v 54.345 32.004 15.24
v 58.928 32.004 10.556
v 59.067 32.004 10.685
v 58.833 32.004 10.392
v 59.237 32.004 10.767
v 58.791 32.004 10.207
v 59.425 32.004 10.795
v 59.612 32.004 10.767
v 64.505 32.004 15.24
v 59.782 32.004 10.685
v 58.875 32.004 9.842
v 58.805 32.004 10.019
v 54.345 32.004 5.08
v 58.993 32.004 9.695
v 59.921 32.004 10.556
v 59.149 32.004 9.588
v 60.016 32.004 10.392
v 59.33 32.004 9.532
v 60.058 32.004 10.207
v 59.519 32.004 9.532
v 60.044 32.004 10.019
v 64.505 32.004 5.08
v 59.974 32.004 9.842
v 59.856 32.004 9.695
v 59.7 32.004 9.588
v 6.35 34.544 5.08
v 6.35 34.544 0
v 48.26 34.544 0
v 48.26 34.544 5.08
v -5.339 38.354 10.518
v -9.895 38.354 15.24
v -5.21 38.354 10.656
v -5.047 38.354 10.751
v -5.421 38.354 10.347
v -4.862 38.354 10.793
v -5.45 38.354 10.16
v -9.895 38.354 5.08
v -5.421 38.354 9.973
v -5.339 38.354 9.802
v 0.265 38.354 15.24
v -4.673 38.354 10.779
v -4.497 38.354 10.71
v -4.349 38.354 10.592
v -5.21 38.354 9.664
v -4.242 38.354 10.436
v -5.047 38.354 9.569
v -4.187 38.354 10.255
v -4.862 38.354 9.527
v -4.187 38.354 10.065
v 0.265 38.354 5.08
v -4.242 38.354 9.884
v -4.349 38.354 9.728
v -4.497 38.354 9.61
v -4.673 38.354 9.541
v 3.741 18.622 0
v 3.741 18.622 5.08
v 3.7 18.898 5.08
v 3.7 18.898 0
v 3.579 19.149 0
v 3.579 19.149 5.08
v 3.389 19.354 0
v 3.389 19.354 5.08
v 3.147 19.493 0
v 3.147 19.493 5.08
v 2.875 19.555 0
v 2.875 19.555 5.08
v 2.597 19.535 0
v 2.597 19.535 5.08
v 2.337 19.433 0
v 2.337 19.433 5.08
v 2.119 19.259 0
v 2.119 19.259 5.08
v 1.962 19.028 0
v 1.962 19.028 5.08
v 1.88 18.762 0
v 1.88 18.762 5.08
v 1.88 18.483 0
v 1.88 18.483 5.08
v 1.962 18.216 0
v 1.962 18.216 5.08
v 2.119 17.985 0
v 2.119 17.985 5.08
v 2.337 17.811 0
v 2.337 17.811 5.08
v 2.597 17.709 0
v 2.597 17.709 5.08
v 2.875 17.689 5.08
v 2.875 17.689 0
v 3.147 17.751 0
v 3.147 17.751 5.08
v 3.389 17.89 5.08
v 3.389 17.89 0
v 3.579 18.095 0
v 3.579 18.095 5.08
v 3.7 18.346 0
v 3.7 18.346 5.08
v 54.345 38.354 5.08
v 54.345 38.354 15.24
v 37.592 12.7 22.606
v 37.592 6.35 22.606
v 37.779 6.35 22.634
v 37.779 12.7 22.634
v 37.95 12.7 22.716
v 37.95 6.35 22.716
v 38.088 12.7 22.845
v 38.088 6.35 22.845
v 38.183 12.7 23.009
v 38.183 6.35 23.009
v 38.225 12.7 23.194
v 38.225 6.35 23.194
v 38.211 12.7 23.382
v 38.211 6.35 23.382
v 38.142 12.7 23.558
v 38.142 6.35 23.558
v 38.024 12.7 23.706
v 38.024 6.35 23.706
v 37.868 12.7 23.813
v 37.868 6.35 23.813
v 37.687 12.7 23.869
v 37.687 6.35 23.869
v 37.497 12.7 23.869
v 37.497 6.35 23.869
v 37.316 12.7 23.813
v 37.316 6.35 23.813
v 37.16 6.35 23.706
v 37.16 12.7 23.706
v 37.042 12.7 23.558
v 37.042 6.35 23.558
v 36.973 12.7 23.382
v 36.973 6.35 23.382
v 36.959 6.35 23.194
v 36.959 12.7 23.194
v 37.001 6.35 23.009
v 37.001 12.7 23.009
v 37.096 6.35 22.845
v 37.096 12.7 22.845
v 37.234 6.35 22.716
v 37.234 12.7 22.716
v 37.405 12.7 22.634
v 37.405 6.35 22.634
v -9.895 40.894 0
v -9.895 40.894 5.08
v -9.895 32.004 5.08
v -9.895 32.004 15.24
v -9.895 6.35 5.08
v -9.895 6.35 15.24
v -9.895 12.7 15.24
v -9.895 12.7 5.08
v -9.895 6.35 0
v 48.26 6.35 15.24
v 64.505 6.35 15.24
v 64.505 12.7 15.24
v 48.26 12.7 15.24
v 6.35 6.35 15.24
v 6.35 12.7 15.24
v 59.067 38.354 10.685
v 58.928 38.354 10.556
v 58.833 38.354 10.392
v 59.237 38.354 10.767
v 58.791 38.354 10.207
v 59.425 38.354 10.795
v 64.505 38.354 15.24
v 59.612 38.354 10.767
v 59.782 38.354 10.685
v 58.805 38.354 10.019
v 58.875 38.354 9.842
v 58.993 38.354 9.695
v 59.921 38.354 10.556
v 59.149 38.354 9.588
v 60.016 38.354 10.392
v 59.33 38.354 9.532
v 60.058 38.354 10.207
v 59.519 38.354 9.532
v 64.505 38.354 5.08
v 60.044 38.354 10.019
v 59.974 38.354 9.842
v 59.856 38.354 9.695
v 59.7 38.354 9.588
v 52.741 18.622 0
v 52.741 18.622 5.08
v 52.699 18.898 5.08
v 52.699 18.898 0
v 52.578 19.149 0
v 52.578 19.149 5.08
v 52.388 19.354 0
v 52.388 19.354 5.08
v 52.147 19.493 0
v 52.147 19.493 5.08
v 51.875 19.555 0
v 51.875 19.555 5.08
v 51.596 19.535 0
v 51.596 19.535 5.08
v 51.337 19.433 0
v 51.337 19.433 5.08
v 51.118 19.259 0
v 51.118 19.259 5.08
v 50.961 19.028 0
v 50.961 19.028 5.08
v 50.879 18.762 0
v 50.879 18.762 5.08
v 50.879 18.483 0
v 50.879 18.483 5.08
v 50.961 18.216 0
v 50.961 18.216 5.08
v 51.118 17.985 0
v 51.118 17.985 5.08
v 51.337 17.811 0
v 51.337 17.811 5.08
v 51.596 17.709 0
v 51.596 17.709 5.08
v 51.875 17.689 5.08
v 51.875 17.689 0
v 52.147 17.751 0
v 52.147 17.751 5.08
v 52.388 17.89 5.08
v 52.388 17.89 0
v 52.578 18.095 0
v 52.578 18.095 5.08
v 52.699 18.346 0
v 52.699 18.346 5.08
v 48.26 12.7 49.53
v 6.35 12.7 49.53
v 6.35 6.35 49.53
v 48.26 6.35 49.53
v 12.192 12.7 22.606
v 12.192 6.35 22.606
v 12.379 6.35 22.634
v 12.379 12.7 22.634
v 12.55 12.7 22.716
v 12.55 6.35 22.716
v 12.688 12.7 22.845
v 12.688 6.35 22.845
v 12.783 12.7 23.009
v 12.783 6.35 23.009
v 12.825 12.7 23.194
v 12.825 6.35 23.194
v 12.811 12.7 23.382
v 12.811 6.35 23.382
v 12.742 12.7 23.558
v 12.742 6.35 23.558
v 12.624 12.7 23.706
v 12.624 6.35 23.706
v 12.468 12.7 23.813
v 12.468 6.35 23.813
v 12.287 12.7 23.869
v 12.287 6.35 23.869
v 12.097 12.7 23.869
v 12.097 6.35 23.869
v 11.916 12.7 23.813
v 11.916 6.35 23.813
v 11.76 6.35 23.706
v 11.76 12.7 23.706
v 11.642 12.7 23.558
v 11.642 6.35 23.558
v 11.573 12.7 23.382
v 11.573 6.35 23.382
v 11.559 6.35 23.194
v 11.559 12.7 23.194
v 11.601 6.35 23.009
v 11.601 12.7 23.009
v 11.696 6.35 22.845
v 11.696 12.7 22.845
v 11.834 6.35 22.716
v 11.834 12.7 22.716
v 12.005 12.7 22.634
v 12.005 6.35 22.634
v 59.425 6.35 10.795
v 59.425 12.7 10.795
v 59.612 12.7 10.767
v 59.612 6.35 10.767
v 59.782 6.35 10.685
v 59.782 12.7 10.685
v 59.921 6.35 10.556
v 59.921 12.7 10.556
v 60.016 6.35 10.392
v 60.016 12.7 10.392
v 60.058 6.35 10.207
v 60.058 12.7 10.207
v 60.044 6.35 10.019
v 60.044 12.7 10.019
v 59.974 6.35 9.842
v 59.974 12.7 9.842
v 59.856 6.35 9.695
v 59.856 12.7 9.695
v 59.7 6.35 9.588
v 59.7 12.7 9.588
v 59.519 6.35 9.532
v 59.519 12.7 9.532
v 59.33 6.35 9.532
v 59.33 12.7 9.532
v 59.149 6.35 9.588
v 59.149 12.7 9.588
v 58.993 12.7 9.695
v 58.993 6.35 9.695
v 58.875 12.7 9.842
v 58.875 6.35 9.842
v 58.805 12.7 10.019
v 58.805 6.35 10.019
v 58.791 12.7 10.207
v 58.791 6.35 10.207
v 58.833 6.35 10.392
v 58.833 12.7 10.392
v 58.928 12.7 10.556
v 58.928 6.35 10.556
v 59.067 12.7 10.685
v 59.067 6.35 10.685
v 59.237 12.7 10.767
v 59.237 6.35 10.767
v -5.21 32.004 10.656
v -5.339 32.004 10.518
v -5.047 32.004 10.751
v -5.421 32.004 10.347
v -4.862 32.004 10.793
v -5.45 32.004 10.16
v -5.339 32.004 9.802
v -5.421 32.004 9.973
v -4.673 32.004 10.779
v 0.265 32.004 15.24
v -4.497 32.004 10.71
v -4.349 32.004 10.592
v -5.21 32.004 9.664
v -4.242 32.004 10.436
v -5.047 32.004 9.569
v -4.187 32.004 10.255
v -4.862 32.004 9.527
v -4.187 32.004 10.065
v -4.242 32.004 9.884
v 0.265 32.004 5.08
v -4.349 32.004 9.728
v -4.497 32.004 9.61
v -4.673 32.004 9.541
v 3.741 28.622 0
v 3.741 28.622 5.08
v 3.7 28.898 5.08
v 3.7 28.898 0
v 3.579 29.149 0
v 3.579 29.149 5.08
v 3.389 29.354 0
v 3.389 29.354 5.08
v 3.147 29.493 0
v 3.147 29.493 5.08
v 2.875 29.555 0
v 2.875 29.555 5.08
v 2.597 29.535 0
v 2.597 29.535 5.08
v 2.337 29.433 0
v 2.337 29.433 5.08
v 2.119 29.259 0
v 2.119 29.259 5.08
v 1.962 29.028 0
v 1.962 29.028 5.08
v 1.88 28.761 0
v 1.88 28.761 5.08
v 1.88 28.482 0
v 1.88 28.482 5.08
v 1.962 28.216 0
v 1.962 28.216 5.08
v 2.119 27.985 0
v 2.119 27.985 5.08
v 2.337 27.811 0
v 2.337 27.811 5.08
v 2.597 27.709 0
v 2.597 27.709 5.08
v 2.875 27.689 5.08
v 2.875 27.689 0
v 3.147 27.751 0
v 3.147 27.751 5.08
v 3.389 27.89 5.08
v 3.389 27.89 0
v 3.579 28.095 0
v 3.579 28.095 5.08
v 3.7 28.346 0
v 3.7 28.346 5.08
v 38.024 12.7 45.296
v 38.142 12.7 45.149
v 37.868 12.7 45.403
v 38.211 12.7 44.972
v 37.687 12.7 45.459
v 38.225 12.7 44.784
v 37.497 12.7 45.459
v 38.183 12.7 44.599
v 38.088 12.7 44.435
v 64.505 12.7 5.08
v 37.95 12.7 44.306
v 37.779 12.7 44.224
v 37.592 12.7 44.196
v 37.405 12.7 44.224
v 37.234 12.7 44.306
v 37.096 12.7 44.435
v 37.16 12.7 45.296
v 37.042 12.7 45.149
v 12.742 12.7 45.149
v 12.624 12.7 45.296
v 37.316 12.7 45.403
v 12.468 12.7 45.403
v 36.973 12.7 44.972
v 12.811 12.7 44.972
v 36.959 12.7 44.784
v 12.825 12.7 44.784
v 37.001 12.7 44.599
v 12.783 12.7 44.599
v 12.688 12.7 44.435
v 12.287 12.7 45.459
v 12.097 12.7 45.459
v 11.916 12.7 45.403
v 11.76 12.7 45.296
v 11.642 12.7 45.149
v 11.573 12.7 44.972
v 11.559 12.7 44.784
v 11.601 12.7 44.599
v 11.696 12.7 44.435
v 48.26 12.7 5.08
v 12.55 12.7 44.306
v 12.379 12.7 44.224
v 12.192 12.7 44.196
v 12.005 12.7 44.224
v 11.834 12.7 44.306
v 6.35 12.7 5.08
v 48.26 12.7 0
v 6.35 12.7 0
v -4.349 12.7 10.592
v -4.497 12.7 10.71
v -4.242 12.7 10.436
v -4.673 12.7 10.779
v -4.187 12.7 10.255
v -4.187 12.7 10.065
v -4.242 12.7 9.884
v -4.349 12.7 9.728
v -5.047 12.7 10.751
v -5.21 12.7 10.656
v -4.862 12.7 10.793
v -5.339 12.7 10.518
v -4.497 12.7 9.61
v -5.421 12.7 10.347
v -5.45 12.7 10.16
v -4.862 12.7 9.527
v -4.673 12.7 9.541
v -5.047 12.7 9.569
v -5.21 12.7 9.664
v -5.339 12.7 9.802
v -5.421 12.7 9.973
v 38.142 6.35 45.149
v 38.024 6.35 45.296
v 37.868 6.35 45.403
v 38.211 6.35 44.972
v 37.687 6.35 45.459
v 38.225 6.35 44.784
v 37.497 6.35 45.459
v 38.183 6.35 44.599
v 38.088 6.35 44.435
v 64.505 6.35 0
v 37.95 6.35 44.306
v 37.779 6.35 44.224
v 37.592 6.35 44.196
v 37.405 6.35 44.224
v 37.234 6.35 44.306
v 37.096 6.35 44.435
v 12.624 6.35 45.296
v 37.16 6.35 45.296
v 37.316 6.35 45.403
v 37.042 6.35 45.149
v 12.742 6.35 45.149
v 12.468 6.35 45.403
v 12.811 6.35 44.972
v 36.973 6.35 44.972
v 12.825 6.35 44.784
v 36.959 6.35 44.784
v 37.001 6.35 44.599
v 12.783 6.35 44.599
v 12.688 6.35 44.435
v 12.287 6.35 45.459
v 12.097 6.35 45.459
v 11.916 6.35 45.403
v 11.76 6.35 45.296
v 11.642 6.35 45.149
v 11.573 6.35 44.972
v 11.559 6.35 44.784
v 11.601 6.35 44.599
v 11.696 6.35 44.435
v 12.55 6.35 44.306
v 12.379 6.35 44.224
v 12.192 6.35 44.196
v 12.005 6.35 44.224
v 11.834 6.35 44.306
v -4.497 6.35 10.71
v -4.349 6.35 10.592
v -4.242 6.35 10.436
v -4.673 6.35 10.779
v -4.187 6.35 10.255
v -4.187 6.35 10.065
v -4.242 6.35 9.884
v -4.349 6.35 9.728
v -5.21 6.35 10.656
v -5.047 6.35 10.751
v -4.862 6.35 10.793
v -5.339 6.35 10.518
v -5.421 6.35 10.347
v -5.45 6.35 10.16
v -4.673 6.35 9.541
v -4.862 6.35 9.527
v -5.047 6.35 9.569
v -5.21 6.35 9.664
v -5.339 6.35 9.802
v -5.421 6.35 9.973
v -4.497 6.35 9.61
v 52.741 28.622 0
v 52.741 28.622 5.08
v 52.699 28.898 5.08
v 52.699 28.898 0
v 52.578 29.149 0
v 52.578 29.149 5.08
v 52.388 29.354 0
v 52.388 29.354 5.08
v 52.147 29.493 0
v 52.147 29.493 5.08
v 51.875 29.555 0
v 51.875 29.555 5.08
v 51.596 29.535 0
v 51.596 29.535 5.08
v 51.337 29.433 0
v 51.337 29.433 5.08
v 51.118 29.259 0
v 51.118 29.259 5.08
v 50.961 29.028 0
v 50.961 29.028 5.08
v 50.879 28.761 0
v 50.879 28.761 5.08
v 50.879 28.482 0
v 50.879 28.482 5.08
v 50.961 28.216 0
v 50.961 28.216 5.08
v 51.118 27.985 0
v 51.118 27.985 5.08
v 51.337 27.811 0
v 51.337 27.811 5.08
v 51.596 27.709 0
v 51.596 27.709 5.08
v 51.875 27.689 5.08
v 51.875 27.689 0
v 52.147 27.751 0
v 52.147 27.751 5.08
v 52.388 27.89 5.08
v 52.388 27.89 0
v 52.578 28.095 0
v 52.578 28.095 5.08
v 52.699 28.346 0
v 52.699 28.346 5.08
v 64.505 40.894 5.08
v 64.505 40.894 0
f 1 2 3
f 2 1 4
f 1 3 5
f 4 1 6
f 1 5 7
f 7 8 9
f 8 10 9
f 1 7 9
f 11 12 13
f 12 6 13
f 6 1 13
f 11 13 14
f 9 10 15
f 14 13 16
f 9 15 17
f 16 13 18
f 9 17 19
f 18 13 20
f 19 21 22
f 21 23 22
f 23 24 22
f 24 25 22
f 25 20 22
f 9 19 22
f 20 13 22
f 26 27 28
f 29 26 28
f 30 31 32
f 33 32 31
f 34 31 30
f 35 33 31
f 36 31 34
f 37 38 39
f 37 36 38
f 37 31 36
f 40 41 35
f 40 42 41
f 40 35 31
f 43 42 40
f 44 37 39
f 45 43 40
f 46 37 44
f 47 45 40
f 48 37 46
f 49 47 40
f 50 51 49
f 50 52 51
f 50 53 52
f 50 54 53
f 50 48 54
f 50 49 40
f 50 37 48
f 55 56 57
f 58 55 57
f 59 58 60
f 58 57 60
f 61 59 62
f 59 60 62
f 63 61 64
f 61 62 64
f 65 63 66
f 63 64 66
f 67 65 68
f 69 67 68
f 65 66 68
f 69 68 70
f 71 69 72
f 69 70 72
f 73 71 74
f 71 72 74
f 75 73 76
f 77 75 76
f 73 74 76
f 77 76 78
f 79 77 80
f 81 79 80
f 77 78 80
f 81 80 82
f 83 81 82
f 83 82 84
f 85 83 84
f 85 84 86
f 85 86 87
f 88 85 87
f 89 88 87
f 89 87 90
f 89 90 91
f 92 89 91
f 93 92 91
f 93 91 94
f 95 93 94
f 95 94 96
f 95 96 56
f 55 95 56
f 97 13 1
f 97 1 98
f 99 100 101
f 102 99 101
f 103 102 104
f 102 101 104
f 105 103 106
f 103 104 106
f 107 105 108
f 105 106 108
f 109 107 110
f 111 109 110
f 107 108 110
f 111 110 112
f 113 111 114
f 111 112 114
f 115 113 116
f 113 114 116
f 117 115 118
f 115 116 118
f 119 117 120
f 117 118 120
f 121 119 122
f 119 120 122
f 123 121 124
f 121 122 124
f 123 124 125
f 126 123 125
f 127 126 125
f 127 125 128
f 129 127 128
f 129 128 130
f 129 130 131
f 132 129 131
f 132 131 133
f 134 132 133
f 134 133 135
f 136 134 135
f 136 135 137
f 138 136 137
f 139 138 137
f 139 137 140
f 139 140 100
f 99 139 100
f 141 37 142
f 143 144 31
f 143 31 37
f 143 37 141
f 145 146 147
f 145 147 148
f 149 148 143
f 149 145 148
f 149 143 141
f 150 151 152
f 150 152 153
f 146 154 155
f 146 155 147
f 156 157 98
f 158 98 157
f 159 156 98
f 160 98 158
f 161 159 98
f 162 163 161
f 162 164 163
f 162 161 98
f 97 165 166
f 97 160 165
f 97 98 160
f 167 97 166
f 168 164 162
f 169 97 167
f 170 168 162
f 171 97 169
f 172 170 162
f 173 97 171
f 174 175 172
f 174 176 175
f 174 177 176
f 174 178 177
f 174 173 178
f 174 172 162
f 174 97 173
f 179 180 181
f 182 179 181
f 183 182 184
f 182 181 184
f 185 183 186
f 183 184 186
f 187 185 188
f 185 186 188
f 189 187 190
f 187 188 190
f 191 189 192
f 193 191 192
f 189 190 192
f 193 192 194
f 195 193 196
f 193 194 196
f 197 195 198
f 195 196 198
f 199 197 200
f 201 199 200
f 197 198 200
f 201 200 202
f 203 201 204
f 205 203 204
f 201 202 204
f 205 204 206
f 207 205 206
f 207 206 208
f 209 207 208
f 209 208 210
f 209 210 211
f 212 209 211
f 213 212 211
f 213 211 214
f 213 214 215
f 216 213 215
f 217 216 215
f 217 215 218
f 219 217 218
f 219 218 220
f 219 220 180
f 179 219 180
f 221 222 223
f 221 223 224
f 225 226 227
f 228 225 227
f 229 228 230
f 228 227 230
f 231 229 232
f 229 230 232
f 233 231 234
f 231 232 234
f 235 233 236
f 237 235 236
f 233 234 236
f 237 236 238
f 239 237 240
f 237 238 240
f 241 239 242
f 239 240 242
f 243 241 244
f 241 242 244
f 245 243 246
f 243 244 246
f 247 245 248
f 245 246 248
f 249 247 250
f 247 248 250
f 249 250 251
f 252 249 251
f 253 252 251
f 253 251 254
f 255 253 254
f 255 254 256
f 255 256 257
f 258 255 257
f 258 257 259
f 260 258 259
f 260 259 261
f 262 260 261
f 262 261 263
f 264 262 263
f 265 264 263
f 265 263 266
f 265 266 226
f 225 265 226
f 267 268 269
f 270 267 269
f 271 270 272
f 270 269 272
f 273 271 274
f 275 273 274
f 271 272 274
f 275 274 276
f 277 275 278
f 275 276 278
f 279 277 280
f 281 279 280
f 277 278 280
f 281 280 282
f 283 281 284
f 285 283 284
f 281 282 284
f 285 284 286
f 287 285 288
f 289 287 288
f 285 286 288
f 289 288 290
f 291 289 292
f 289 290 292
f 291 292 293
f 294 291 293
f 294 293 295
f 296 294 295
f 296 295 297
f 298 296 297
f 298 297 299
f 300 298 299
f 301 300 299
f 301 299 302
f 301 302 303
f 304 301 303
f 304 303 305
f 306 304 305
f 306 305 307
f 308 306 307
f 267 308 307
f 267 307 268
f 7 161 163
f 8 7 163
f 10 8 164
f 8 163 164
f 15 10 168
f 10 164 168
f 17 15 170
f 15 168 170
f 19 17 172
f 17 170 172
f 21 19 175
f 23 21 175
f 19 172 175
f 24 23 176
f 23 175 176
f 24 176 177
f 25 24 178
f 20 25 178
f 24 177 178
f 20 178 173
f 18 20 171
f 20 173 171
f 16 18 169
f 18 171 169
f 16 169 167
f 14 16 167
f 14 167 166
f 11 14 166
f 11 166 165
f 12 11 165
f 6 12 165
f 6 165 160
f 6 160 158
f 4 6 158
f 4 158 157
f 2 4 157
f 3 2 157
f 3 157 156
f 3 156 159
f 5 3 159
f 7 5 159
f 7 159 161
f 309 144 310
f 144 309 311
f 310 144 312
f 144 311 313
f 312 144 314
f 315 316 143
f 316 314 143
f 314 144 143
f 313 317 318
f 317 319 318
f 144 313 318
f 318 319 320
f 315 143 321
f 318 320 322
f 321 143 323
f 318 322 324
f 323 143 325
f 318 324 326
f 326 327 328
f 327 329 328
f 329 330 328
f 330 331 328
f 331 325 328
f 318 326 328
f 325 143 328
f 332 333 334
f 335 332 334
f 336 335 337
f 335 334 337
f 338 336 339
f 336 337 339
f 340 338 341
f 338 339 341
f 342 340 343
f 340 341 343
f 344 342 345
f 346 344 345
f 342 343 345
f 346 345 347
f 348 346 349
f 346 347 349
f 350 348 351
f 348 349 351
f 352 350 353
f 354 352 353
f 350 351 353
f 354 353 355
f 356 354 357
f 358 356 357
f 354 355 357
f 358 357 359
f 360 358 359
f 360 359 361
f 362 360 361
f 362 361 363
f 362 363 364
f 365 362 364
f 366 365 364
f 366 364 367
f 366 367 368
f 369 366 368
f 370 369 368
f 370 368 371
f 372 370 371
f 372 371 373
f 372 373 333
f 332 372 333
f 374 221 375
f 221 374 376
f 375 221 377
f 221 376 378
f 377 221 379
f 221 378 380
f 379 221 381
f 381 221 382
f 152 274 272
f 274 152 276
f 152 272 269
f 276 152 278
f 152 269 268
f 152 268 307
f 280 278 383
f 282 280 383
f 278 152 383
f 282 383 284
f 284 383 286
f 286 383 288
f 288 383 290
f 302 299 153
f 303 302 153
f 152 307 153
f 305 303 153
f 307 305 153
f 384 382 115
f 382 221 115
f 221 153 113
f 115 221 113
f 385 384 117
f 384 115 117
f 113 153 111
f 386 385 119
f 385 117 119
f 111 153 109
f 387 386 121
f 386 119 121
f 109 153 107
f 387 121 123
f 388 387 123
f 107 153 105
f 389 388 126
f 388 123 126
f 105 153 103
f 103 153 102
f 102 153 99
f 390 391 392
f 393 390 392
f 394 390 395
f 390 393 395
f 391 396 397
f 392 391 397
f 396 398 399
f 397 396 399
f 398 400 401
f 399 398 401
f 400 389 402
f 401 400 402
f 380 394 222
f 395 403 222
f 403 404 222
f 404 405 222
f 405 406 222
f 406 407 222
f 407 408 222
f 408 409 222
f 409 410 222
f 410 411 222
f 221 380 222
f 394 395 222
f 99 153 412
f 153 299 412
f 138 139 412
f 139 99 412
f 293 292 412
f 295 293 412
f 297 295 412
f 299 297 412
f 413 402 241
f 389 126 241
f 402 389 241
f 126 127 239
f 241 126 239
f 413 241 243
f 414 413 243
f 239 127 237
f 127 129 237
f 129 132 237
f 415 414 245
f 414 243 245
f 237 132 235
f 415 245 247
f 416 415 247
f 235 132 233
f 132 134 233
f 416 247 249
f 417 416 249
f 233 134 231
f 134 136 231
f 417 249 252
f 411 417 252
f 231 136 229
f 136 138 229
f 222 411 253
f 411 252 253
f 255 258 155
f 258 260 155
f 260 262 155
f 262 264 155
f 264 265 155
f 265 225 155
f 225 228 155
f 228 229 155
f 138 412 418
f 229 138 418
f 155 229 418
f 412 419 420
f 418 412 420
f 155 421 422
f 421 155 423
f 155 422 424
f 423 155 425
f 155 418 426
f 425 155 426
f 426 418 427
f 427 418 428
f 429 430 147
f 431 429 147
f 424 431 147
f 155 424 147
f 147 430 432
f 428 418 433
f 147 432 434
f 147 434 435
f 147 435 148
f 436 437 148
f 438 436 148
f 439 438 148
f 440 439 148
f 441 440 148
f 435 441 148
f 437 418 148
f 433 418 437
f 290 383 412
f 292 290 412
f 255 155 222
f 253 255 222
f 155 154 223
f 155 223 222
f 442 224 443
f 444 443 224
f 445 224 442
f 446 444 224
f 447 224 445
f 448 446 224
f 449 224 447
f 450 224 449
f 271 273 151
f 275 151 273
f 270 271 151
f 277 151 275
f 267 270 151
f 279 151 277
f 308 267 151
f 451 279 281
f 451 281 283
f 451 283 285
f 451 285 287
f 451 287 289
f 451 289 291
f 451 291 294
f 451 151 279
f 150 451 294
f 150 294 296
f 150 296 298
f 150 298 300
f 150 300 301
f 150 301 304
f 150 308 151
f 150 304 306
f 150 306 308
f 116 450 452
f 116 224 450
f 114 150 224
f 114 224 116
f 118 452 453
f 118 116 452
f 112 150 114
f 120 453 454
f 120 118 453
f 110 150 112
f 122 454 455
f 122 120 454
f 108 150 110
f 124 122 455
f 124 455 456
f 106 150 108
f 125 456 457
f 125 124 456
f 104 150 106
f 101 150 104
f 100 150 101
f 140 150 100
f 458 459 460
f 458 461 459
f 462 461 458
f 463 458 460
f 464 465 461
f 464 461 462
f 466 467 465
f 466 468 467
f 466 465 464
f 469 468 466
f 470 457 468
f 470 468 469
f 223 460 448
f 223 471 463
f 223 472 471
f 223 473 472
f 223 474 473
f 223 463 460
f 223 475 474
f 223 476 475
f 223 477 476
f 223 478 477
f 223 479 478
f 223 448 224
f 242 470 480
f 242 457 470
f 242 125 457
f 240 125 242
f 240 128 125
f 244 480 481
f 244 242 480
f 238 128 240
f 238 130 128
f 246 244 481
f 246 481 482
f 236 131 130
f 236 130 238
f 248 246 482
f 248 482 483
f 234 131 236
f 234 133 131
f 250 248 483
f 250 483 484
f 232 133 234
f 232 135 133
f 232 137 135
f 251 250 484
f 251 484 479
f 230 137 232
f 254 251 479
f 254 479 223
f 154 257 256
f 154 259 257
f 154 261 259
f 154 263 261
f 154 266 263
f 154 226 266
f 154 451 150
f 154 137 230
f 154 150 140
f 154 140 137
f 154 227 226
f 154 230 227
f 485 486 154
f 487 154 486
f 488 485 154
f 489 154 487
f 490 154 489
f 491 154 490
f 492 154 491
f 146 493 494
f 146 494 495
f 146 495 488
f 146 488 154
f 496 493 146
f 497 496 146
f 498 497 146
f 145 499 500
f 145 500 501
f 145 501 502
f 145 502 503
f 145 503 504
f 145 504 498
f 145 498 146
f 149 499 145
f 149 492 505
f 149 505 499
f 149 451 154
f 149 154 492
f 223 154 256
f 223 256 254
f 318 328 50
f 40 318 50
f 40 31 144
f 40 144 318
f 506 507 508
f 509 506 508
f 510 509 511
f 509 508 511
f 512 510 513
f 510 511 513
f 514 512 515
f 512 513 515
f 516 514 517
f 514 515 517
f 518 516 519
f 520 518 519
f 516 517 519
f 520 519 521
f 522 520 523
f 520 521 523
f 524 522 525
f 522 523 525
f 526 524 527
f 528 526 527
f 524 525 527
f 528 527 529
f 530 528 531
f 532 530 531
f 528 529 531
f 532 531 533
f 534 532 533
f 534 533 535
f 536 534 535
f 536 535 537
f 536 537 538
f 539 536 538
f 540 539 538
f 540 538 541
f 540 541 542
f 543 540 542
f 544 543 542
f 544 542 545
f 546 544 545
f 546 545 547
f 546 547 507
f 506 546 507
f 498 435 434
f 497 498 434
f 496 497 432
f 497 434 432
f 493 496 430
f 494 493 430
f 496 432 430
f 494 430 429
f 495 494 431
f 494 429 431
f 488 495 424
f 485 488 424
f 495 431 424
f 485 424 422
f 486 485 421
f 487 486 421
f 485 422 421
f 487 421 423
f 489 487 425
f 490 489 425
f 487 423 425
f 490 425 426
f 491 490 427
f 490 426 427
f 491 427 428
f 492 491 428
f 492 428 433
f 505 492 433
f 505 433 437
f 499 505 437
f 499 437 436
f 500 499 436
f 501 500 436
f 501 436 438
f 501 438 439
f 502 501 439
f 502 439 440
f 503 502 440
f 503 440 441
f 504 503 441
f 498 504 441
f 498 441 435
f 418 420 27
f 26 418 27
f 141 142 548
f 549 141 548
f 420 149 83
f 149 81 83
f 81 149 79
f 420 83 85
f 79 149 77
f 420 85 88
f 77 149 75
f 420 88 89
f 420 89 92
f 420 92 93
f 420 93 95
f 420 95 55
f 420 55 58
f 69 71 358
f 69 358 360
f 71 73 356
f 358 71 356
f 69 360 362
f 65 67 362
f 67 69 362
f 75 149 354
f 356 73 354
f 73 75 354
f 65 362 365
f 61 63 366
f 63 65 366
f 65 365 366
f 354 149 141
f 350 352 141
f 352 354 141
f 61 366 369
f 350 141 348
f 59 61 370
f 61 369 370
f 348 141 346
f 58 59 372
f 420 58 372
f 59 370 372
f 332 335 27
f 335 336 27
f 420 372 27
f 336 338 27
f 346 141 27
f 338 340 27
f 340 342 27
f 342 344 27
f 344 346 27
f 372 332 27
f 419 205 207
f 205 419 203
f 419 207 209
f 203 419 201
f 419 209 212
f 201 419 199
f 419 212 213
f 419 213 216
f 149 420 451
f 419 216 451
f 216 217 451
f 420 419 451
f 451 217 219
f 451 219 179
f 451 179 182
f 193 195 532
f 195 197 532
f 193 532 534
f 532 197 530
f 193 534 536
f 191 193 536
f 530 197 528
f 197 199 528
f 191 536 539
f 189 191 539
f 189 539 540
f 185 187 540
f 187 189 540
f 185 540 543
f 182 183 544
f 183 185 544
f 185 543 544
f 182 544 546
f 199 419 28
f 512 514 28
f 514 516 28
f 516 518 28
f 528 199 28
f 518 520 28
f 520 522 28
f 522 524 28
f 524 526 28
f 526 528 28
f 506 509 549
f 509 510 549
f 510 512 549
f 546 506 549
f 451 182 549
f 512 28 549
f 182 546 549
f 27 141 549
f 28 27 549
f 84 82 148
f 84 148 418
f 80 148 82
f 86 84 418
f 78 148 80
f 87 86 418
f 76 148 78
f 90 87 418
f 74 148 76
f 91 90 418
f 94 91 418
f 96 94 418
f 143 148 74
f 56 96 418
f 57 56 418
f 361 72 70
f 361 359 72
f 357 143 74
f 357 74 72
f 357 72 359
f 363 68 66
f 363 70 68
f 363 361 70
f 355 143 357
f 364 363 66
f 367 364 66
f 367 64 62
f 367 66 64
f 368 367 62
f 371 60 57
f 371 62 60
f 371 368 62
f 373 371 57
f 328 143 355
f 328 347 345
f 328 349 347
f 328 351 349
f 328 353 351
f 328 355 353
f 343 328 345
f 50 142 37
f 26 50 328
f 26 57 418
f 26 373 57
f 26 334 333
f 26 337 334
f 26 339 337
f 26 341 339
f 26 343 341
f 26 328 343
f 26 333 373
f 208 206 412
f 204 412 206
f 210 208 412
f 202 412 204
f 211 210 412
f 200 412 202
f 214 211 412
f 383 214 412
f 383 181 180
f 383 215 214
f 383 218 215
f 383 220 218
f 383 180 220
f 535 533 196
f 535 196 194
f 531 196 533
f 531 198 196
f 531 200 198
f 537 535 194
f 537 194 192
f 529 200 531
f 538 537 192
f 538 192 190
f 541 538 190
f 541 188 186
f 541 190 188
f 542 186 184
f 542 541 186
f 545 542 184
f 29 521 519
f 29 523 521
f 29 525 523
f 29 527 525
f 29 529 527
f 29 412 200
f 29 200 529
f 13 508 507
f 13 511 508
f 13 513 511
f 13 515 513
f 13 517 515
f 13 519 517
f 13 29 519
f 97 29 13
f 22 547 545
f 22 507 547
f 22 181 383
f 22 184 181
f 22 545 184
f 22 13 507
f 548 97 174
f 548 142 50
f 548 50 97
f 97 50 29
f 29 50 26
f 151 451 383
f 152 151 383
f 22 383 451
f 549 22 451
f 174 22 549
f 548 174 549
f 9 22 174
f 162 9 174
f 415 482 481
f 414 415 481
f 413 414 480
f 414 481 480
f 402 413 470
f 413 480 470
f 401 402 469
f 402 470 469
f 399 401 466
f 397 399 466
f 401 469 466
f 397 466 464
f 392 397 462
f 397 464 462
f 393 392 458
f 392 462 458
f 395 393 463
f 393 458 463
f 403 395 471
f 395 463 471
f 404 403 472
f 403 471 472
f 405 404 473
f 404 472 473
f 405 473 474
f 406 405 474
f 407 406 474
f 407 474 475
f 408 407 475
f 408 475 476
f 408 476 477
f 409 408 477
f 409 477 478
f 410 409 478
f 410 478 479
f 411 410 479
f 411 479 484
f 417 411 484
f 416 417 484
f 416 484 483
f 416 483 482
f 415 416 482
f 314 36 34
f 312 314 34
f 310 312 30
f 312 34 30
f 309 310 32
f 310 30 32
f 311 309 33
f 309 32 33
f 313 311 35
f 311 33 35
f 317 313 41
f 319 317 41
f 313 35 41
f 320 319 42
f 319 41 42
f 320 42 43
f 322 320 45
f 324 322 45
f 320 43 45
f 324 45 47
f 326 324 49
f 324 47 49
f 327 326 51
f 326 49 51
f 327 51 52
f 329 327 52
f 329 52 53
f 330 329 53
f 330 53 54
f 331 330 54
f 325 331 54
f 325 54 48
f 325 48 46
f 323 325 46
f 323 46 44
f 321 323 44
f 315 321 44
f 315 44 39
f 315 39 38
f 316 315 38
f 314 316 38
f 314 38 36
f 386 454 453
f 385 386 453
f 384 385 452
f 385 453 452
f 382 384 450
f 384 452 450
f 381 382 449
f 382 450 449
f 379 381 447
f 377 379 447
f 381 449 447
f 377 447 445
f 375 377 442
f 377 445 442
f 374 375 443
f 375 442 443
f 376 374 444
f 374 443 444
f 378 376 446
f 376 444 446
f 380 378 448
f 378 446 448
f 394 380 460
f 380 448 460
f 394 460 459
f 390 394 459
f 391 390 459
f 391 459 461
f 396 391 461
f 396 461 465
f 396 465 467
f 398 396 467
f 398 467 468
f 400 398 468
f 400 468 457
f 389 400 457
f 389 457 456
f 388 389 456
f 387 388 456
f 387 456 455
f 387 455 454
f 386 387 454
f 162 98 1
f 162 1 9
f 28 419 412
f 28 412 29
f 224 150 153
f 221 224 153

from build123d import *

# Parameters (mm, degrees)
SKETCH1_W            = 54.61
SKETCH1_H            = 47.244
SKETCH1_W_2          = 41.91
SKETCH1_H_2          = 21.844
BOSS_EXTRUDE1_DEPTH  = 5.08
SKETCH2_R            = 0.93599
CUT_EXTRUDE1_DEPTH   = 73.388217522
SKETCH10_W           = 14.41958
SKETCH10_H           = 19.49958
SKETCH10_R           = 0.635
BOSS_EXTRUDE4_DEPTH  = 5.08
SKETCH11_R           = 0.635
SKETCH11_W           = 3.302
SKETCH11_H           = 76.2
BOSS_EXTRUDE5_DEPTH  = 5.08
SKETCH12_W           = 60.452
SKETCH12_H           = 6.35
SKETCH12_W_2         = 59.182
CUT_EXTRUDE2_DEPTH   = 95.448366629
SKETCH13_W           = 7.0195552
SKETCH13_H           = 78.993394517
BOSS_EXTRUDE6_DEPTH  = 4.826
FILLET1_R            = 2.54
CUT_EXTRUDE3_DEPTH   = 95.448366629
SKETCH15_W           = 9.078627065
SKETCH15_H           = 34.544
BOSS_EXTRUDE7_DEPTH  = 5.08
SKETCH16_W           = 10.16
SKETCH16_H           = 6.35
BOSS_EXTRUDE8_DEPTH  = 10.16
SKETCH19_W           = 41.91
SKETCH19_H           = 6.35
BOSS_EXTRUDE10_DEPTH = 44.45
SKETCH20_W           = 16.24457
SKETCH20_H           = 10.16
BOSS_EXTRUDE11_DEPTH = 6.35
SKETCH17_R           = 0.635
CUT_EXTRUDE4_DEPTH   = 88.397462588
SKETCH21_R           = 0.635
CUT_EXTRUDE5_DEPTH   = 89.359200918


with BuildPart() as part:
    # Sketch1 → Boss-Extrude1 (new body)
    with BuildSketch(Plane.XY):
        with Locations((27.305, 23.622)):
            Rectangle(SKETCH1_W, SKETCH1_H)
        with Locations((27.305, 23.622)):
            Rectangle(SKETCH1_W_2, SKETCH1_H_2, mode=Mode.SUBTRACT)
    extrude(amount=BOSS_EXTRUDE1_DEPTH)

    # Sketch2 → Cut-Extrude1 (cut, through all)
    with BuildSketch(Plane.XY.offset(5.08)):
        with Locations((2.80543, 28.62199)):
            Circle(SKETCH2_R)
        with Locations((2.80543, 18.62201)):
            Circle(SKETCH2_R)
        with Locations((51.80457, 28.62199)):
            Circle(SKETCH2_R)
        with Locations((51.80457, 18.62201)):
            Circle(SKETCH2_R)
    extrude(amount=-CUT_EXTRUDE1_DEPTH, mode=Mode.SUBTRACT)

    # Sketch10 → Boss-Extrude4 (add)
    with BuildSketch(Plane.XY.offset(5.08)):
        with Locations((61.81979, 23.622)):
            Rectangle(SKETCH10_W, SKETCH10_H)
        with Locations((64.35979, 21.49221)):
            Circle(SKETCH10_R, mode=Mode.SUBTRACT)
        with Locations((64.35979, 25.75179)):
            Circle(SKETCH10_R, mode=Mode.SUBTRACT)
    extrude(amount=-BOSS_EXTRUDE4_DEPTH)

    # Sketch11 → Boss-Extrude5 (add)
    with BuildSketch(Plane.XY.offset(5.08)):
        Polygon((0, 47.244), (-5.842, 47.244), (-5.842, 64.262), (-15.748, 64.262), (-15.748, -17.018), (-4.572, -17.018), (-4.572, 0), (0, 0), align=None)
        with Locations(Location((-4.572, 21.49221, 0), (0, 0, 180))):
            Circle(SKETCH11_R, mode=Mode.SUBTRACT)
        with Locations(Location((-4.572, 25.75179, 0), (0, 0, 180))):
            Circle(SKETCH11_R, mode=Mode.SUBTRACT)
        with Locations((-10.795, 23.622)):
            Rectangle(SKETCH11_W, SKETCH11_H, mode=Mode.SUBTRACT)
    extrude(amount=-BOSS_EXTRUDE5_DEPTH)

    # Sketch12 → Cut-Extrude2 (cut, through all)
    with BuildSketch(Plane.XY.offset(5.08)):
        with Locations((24.384, 44.069)):
            Rectangle(SKETCH12_W, SKETCH12_H)
        with Locations((25.019, 3.175)):
            Rectangle(SKETCH12_W_2, SKETCH12_H)
    extrude(amount=-CUT_EXTRUDE2_DEPTH, mode=Mode.SUBTRACT)

    # Sketch13 → Boss-Extrude6 (add)
    with BuildSketch(Plane(origin=(0, 0, 0), x_dir=(-1, 0, 0), z_dir=(0, 0, -1))):
        with Locations((10.665198327, 23.388014827)):
            Rectangle(SKETCH13_W, SKETCH13_H)
    extrude(amount=-BOSS_EXTRUDE6_DEPTH)

    # Fillet1
    fillet1_edges = [part.edges().sort_by_distance(p)[0] for p in [
        (69.02958, 13.87221, 2.54),
        (54.61, 13.87221, 2.54),
        (54.61, 6.35, 2.54),
        (-4.572, 6.35, 2.54),
        (-4.572, -17.018, 2.54),
        (-15.748, -17.018, 2.54),
        (-15.748, 64.262, 2.54),
        (-5.842, 64.262, 2.54),
        (-5.842, 40.894, 2.54),
        (54.61, 40.894, 2.54),
        (54.61, 33.37179, 2.54),
        (69.02958, 33.37179, 2.54),
    ]]
    fillet(fillet1_edges, radius=FILLET1_R)

    # Sketch14 → Cut-Extrude3 (cut, through all)
    with BuildSketch(Plane.XY.offset(5.08)):
        Polygon((2.80543, 40.894), (-0.815942935, 40.894), (-0.815942935, 6.35), (2.80543, 6.35), (2.80543, -19.941776761), (-23.515321153, -19.941776761), (-23.515321153, 65.826532556), (2.80543, 65.826532556), align=None)
        Polygon((51.80457, 40.896870143), (51.80457, 65.826532556), (74.486186006, 65.826532556), (74.486186006, -19.941776761), (51.80457, -19.941776761), (52.07, 6.35), (54.61, 8.89), (54.61, 38.354), align=None)
    extrude(amount=-CUT_EXTRUDE3_DEPTH, mode=Mode.SUBTRACT)

    # Sketch15 → Boss-Extrude7 (add)
    with BuildSketch(Plane.XY.offset(5.08)):
        with Locations((-5.355256468, 23.622)):
            Rectangle(SKETCH15_W, SKETCH15_H)
        Polygon((51.807736495, 40.894), (54.61, 38.354), (54.61, 8.89), (52.07, 6.35), (64.50457, 6.35), (64.50457, 40.894), align=None)
    extrude(amount=-BOSS_EXTRUDE7_DEPTH)

    # Sketch16 → Boss-Extrude8 (add)
    with BuildSketch(Plane.XY.offset(5.08)):
        with Locations((-4.81457, 35.179)):
            Rectangle(SKETCH16_W, SKETCH16_H)
        with Locations((59.42457, 35.179)):
            Rectangle(SKETCH16_W, SKETCH16_H)
    extrude(amount=BOSS_EXTRUDE8_DEPTH)

    # Sketch19 → Boss-Extrude10 (add)
    with BuildSketch(Plane.XY.offset(5.08)):
        with Locations((27.305, 9.525)):
            Rectangle(SKETCH19_W, SKETCH19_H)
    extrude(amount=BOSS_EXTRUDE10_DEPTH)

    # Sketch20 → Boss-Extrude11 (add)
    with BuildSketch(Plane(origin=(0, 6.35, 0), x_dir=(-1, 0, 0), z_dir=(0, -1, 0))):
        with Locations((1.772285, -10.16)):
            Rectangle(SKETCH20_W, SKETCH20_H)
        with Locations((-56.382285, -10.16)):
            Rectangle(SKETCH20_W, SKETCH20_H)
    extrude(amount=-BOSS_EXTRUDE11_DEPTH)

    # Sketch17 → Cut-Extrude4 (cut, through all)
    with BuildSketch(Plane(origin=(0, 38.354, 0), x_dir=(1, 0, 0), z_dir=(0, 1, 0))):
        with Locations(Location((-4.81457, -10.16, 0), (0, 0, 180))):
            Circle(SKETCH17_R)
        with Locations(Location((59.42457, -10.16, 0), (0, 0, 270))):
            Circle(SKETCH17_R)
    extrude(amount=-CUT_EXTRUDE4_DEPTH, mode=Mode.SUBTRACT)

    # Sketch21 → Cut-Extrude5 (cut, through all)
    with BuildSketch(Plane.XZ.offset(-6.35)):
        with Locations(Location((37.592, 23.241, 0), (0, 0, 270))):
            Circle(SKETCH21_R)
        with Locations(Location((37.592, 44.831, 0), (0, 0, 270))):
            Circle(SKETCH21_R)
        with Locations(Location((12.192, 44.831, 0), (0, 0, 270))):
            Circle(SKETCH21_R)
        with Locations(Location((12.192, 23.241, 0), (0, 0, 270))):
            Circle(SKETCH21_R)
    extrude(amount=-CUT_EXTRUDE5_DEPTH, mode=Mode.SUBTRACT)


solid = part.part
